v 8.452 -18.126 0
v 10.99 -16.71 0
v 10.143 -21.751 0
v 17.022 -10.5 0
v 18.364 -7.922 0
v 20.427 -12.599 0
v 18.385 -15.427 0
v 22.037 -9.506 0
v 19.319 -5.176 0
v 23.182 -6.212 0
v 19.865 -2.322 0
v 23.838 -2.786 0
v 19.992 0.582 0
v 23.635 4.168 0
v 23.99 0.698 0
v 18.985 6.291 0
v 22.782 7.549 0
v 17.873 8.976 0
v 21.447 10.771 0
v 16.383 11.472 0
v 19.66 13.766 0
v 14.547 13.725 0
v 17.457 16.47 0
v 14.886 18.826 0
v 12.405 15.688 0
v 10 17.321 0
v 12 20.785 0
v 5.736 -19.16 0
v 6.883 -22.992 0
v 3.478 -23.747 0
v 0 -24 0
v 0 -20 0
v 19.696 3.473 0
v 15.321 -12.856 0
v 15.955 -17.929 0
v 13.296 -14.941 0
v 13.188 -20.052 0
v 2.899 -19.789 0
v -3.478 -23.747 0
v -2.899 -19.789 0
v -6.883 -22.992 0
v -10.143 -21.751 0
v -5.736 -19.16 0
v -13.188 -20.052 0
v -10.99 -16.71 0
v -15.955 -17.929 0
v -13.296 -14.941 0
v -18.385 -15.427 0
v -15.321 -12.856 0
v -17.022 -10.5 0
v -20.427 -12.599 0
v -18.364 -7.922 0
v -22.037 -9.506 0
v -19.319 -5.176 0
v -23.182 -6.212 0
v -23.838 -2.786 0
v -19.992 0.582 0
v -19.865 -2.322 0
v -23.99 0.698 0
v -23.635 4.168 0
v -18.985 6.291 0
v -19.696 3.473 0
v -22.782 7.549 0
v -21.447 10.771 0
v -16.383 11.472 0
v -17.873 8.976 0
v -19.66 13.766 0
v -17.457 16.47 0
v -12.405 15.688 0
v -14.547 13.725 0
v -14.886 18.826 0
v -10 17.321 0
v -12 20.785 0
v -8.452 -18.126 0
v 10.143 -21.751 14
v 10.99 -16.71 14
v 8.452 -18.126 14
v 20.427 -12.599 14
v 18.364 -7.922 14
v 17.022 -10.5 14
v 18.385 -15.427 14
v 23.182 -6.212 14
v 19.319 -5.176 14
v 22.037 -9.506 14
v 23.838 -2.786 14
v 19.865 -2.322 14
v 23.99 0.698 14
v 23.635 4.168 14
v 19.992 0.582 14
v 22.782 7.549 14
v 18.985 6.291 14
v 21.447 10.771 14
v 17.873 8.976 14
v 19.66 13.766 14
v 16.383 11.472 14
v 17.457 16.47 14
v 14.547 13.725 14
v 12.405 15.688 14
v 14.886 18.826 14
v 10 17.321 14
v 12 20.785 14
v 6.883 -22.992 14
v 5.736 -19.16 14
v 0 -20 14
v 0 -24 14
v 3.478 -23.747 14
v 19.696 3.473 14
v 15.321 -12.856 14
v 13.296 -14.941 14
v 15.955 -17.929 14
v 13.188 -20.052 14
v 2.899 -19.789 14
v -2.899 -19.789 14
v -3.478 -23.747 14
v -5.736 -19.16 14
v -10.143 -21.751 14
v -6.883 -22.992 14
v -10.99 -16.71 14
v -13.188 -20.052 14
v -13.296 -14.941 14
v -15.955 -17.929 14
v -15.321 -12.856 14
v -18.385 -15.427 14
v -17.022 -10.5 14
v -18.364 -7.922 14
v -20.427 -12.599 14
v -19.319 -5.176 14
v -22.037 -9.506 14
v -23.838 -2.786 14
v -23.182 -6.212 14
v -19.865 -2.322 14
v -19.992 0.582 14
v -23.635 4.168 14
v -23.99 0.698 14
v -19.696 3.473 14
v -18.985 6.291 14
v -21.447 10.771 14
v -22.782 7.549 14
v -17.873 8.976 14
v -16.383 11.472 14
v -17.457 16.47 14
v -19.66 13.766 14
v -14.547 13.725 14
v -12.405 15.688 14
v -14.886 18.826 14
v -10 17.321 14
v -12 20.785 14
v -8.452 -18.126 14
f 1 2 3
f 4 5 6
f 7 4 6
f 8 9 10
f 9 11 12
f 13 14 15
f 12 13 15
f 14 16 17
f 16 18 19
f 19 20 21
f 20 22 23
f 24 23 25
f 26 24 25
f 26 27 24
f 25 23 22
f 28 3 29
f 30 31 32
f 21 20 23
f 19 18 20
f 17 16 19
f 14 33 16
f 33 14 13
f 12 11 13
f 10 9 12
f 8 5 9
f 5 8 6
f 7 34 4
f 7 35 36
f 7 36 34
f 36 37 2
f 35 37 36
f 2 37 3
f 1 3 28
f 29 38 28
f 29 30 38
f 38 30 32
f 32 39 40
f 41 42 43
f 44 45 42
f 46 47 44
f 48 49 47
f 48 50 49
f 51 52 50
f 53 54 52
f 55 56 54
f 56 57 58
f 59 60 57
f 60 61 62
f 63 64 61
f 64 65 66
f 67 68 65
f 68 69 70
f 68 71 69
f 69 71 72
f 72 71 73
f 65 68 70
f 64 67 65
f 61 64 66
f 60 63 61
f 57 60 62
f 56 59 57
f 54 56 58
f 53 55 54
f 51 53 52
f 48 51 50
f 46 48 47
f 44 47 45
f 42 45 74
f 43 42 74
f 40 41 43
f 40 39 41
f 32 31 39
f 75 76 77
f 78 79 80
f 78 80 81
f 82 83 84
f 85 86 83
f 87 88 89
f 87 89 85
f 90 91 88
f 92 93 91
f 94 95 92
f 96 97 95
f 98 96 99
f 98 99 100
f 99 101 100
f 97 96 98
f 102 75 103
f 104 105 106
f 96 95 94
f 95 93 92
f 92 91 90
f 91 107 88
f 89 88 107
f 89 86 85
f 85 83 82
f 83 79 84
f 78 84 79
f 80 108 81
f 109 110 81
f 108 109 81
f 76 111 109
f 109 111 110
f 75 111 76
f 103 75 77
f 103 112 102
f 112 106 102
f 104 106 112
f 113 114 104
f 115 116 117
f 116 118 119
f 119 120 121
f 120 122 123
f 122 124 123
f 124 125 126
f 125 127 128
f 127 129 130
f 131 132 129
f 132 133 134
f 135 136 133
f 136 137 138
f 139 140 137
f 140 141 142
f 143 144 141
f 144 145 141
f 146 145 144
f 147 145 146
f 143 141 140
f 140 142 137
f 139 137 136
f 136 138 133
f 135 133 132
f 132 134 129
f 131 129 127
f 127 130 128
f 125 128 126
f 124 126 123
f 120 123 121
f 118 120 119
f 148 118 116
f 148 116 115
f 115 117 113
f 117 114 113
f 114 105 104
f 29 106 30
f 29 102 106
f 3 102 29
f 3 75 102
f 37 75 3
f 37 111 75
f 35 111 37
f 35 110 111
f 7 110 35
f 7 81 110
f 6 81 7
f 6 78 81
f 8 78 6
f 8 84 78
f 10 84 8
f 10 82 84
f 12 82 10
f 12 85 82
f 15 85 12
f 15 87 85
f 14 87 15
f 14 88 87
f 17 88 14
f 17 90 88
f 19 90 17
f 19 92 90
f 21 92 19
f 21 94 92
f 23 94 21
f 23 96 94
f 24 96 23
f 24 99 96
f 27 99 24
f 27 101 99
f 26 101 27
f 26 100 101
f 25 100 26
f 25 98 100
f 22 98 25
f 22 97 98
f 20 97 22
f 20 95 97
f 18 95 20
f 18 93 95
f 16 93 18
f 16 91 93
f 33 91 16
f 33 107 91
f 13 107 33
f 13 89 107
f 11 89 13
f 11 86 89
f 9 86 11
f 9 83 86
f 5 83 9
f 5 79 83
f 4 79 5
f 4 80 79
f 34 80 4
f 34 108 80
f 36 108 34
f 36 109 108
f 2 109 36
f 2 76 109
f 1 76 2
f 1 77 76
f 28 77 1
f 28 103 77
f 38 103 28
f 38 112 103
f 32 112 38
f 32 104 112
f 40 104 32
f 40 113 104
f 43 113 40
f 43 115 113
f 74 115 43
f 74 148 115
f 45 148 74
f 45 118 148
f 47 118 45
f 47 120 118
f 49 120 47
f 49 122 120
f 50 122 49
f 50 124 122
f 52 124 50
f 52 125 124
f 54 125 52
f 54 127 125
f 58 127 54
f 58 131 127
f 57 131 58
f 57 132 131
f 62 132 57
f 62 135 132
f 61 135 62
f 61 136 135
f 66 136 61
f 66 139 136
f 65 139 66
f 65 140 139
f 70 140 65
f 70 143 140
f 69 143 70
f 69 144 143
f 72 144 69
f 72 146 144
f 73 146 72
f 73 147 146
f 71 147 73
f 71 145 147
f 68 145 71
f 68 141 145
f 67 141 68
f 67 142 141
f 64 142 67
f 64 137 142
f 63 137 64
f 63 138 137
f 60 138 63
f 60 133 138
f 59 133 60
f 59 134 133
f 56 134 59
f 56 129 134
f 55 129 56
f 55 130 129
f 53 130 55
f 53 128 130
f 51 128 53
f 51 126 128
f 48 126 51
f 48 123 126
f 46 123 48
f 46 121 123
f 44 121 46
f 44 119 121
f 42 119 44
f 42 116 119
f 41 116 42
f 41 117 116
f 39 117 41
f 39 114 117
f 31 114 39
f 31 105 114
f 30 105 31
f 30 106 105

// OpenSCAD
$fn = 32;

// ----------------------------------------------------------------------
// Spring clip: 48 mm outside, 4 mm band, 60 degree opening
// ----------------------------------------------------------------------

// --- parameters (mm) ---
outer_r = 24;             // clip outside radius
inner_r = 20;             // clip bore radius
band = 4;                 // band thickness
clip_w = 14;              // clip width
opening = 60;             // opening angle

clip_profile = [[-12, 20.785], [-14.886, 18.826], [-17.457, 16.47], [-19.66, 13.766], [-21.447, 10.771], [-22.782, 7.549], [-23.635, 4.168], [-23.99, 0.698], [-23.838, -2.786], [-23.182, -6.212], [-22.037, -9.506], [-20.427, -12.599], [-18.385, -15.427], [-15.955, -17.929], [-13.188, -20.052], [-10.143, -21.751], [-6.883, -22.992], [-3.478, -23.747], [0, -24], [3.478, -23.747], [6.883, -22.992], [10.143, -21.751], [13.188, -20.052], [15.955, -17.929], [18.385, -15.427], [20.427, -12.599], [22.037, -9.506], [23.182, -6.212], [23.838, -2.786], [23.99, 0.698], [23.635, 4.168], [22.782, 7.549], [21.447, 10.771], [19.66, 13.766], [17.457, 16.47], [14.886, 18.826], [12, 20.785], [10, 17.321], [12.405, 15.688], [14.547, 13.725], [16.383, 11.472], [17.873, 8.976], [18.985, 6.291], [19.696, 3.473], [19.992, 0.582], [19.865, -2.322], [19.319, -5.176], [18.364, -7.922], [17.022, -10.5], [15.321, -12.856], [13.296, -14.941], [10.99, -16.71], [8.452, -18.126], [5.736, -19.16], [2.899, -19.789], [0, -20], [-2.899, -19.789], [-5.736, -19.16], [-8.452, -18.126], [-10.99, -16.71], [-13.296, -14.941], [-15.321, -12.856], [-17.022, -10.5], [-18.364, -7.922], [-19.319, -5.176], [-19.865, -2.322], [-19.992, 0.582], [-19.696, 3.473], [-18.985, 6.291], [-17.873, 8.976], [-16.383, 11.472], [-14.547, 13.725], [-12.405, 15.688], [-10, 17.321]];

difference() {
  union() {
    linear_extrude(height = clip_w) polygon(clip_profile);
  }
}
